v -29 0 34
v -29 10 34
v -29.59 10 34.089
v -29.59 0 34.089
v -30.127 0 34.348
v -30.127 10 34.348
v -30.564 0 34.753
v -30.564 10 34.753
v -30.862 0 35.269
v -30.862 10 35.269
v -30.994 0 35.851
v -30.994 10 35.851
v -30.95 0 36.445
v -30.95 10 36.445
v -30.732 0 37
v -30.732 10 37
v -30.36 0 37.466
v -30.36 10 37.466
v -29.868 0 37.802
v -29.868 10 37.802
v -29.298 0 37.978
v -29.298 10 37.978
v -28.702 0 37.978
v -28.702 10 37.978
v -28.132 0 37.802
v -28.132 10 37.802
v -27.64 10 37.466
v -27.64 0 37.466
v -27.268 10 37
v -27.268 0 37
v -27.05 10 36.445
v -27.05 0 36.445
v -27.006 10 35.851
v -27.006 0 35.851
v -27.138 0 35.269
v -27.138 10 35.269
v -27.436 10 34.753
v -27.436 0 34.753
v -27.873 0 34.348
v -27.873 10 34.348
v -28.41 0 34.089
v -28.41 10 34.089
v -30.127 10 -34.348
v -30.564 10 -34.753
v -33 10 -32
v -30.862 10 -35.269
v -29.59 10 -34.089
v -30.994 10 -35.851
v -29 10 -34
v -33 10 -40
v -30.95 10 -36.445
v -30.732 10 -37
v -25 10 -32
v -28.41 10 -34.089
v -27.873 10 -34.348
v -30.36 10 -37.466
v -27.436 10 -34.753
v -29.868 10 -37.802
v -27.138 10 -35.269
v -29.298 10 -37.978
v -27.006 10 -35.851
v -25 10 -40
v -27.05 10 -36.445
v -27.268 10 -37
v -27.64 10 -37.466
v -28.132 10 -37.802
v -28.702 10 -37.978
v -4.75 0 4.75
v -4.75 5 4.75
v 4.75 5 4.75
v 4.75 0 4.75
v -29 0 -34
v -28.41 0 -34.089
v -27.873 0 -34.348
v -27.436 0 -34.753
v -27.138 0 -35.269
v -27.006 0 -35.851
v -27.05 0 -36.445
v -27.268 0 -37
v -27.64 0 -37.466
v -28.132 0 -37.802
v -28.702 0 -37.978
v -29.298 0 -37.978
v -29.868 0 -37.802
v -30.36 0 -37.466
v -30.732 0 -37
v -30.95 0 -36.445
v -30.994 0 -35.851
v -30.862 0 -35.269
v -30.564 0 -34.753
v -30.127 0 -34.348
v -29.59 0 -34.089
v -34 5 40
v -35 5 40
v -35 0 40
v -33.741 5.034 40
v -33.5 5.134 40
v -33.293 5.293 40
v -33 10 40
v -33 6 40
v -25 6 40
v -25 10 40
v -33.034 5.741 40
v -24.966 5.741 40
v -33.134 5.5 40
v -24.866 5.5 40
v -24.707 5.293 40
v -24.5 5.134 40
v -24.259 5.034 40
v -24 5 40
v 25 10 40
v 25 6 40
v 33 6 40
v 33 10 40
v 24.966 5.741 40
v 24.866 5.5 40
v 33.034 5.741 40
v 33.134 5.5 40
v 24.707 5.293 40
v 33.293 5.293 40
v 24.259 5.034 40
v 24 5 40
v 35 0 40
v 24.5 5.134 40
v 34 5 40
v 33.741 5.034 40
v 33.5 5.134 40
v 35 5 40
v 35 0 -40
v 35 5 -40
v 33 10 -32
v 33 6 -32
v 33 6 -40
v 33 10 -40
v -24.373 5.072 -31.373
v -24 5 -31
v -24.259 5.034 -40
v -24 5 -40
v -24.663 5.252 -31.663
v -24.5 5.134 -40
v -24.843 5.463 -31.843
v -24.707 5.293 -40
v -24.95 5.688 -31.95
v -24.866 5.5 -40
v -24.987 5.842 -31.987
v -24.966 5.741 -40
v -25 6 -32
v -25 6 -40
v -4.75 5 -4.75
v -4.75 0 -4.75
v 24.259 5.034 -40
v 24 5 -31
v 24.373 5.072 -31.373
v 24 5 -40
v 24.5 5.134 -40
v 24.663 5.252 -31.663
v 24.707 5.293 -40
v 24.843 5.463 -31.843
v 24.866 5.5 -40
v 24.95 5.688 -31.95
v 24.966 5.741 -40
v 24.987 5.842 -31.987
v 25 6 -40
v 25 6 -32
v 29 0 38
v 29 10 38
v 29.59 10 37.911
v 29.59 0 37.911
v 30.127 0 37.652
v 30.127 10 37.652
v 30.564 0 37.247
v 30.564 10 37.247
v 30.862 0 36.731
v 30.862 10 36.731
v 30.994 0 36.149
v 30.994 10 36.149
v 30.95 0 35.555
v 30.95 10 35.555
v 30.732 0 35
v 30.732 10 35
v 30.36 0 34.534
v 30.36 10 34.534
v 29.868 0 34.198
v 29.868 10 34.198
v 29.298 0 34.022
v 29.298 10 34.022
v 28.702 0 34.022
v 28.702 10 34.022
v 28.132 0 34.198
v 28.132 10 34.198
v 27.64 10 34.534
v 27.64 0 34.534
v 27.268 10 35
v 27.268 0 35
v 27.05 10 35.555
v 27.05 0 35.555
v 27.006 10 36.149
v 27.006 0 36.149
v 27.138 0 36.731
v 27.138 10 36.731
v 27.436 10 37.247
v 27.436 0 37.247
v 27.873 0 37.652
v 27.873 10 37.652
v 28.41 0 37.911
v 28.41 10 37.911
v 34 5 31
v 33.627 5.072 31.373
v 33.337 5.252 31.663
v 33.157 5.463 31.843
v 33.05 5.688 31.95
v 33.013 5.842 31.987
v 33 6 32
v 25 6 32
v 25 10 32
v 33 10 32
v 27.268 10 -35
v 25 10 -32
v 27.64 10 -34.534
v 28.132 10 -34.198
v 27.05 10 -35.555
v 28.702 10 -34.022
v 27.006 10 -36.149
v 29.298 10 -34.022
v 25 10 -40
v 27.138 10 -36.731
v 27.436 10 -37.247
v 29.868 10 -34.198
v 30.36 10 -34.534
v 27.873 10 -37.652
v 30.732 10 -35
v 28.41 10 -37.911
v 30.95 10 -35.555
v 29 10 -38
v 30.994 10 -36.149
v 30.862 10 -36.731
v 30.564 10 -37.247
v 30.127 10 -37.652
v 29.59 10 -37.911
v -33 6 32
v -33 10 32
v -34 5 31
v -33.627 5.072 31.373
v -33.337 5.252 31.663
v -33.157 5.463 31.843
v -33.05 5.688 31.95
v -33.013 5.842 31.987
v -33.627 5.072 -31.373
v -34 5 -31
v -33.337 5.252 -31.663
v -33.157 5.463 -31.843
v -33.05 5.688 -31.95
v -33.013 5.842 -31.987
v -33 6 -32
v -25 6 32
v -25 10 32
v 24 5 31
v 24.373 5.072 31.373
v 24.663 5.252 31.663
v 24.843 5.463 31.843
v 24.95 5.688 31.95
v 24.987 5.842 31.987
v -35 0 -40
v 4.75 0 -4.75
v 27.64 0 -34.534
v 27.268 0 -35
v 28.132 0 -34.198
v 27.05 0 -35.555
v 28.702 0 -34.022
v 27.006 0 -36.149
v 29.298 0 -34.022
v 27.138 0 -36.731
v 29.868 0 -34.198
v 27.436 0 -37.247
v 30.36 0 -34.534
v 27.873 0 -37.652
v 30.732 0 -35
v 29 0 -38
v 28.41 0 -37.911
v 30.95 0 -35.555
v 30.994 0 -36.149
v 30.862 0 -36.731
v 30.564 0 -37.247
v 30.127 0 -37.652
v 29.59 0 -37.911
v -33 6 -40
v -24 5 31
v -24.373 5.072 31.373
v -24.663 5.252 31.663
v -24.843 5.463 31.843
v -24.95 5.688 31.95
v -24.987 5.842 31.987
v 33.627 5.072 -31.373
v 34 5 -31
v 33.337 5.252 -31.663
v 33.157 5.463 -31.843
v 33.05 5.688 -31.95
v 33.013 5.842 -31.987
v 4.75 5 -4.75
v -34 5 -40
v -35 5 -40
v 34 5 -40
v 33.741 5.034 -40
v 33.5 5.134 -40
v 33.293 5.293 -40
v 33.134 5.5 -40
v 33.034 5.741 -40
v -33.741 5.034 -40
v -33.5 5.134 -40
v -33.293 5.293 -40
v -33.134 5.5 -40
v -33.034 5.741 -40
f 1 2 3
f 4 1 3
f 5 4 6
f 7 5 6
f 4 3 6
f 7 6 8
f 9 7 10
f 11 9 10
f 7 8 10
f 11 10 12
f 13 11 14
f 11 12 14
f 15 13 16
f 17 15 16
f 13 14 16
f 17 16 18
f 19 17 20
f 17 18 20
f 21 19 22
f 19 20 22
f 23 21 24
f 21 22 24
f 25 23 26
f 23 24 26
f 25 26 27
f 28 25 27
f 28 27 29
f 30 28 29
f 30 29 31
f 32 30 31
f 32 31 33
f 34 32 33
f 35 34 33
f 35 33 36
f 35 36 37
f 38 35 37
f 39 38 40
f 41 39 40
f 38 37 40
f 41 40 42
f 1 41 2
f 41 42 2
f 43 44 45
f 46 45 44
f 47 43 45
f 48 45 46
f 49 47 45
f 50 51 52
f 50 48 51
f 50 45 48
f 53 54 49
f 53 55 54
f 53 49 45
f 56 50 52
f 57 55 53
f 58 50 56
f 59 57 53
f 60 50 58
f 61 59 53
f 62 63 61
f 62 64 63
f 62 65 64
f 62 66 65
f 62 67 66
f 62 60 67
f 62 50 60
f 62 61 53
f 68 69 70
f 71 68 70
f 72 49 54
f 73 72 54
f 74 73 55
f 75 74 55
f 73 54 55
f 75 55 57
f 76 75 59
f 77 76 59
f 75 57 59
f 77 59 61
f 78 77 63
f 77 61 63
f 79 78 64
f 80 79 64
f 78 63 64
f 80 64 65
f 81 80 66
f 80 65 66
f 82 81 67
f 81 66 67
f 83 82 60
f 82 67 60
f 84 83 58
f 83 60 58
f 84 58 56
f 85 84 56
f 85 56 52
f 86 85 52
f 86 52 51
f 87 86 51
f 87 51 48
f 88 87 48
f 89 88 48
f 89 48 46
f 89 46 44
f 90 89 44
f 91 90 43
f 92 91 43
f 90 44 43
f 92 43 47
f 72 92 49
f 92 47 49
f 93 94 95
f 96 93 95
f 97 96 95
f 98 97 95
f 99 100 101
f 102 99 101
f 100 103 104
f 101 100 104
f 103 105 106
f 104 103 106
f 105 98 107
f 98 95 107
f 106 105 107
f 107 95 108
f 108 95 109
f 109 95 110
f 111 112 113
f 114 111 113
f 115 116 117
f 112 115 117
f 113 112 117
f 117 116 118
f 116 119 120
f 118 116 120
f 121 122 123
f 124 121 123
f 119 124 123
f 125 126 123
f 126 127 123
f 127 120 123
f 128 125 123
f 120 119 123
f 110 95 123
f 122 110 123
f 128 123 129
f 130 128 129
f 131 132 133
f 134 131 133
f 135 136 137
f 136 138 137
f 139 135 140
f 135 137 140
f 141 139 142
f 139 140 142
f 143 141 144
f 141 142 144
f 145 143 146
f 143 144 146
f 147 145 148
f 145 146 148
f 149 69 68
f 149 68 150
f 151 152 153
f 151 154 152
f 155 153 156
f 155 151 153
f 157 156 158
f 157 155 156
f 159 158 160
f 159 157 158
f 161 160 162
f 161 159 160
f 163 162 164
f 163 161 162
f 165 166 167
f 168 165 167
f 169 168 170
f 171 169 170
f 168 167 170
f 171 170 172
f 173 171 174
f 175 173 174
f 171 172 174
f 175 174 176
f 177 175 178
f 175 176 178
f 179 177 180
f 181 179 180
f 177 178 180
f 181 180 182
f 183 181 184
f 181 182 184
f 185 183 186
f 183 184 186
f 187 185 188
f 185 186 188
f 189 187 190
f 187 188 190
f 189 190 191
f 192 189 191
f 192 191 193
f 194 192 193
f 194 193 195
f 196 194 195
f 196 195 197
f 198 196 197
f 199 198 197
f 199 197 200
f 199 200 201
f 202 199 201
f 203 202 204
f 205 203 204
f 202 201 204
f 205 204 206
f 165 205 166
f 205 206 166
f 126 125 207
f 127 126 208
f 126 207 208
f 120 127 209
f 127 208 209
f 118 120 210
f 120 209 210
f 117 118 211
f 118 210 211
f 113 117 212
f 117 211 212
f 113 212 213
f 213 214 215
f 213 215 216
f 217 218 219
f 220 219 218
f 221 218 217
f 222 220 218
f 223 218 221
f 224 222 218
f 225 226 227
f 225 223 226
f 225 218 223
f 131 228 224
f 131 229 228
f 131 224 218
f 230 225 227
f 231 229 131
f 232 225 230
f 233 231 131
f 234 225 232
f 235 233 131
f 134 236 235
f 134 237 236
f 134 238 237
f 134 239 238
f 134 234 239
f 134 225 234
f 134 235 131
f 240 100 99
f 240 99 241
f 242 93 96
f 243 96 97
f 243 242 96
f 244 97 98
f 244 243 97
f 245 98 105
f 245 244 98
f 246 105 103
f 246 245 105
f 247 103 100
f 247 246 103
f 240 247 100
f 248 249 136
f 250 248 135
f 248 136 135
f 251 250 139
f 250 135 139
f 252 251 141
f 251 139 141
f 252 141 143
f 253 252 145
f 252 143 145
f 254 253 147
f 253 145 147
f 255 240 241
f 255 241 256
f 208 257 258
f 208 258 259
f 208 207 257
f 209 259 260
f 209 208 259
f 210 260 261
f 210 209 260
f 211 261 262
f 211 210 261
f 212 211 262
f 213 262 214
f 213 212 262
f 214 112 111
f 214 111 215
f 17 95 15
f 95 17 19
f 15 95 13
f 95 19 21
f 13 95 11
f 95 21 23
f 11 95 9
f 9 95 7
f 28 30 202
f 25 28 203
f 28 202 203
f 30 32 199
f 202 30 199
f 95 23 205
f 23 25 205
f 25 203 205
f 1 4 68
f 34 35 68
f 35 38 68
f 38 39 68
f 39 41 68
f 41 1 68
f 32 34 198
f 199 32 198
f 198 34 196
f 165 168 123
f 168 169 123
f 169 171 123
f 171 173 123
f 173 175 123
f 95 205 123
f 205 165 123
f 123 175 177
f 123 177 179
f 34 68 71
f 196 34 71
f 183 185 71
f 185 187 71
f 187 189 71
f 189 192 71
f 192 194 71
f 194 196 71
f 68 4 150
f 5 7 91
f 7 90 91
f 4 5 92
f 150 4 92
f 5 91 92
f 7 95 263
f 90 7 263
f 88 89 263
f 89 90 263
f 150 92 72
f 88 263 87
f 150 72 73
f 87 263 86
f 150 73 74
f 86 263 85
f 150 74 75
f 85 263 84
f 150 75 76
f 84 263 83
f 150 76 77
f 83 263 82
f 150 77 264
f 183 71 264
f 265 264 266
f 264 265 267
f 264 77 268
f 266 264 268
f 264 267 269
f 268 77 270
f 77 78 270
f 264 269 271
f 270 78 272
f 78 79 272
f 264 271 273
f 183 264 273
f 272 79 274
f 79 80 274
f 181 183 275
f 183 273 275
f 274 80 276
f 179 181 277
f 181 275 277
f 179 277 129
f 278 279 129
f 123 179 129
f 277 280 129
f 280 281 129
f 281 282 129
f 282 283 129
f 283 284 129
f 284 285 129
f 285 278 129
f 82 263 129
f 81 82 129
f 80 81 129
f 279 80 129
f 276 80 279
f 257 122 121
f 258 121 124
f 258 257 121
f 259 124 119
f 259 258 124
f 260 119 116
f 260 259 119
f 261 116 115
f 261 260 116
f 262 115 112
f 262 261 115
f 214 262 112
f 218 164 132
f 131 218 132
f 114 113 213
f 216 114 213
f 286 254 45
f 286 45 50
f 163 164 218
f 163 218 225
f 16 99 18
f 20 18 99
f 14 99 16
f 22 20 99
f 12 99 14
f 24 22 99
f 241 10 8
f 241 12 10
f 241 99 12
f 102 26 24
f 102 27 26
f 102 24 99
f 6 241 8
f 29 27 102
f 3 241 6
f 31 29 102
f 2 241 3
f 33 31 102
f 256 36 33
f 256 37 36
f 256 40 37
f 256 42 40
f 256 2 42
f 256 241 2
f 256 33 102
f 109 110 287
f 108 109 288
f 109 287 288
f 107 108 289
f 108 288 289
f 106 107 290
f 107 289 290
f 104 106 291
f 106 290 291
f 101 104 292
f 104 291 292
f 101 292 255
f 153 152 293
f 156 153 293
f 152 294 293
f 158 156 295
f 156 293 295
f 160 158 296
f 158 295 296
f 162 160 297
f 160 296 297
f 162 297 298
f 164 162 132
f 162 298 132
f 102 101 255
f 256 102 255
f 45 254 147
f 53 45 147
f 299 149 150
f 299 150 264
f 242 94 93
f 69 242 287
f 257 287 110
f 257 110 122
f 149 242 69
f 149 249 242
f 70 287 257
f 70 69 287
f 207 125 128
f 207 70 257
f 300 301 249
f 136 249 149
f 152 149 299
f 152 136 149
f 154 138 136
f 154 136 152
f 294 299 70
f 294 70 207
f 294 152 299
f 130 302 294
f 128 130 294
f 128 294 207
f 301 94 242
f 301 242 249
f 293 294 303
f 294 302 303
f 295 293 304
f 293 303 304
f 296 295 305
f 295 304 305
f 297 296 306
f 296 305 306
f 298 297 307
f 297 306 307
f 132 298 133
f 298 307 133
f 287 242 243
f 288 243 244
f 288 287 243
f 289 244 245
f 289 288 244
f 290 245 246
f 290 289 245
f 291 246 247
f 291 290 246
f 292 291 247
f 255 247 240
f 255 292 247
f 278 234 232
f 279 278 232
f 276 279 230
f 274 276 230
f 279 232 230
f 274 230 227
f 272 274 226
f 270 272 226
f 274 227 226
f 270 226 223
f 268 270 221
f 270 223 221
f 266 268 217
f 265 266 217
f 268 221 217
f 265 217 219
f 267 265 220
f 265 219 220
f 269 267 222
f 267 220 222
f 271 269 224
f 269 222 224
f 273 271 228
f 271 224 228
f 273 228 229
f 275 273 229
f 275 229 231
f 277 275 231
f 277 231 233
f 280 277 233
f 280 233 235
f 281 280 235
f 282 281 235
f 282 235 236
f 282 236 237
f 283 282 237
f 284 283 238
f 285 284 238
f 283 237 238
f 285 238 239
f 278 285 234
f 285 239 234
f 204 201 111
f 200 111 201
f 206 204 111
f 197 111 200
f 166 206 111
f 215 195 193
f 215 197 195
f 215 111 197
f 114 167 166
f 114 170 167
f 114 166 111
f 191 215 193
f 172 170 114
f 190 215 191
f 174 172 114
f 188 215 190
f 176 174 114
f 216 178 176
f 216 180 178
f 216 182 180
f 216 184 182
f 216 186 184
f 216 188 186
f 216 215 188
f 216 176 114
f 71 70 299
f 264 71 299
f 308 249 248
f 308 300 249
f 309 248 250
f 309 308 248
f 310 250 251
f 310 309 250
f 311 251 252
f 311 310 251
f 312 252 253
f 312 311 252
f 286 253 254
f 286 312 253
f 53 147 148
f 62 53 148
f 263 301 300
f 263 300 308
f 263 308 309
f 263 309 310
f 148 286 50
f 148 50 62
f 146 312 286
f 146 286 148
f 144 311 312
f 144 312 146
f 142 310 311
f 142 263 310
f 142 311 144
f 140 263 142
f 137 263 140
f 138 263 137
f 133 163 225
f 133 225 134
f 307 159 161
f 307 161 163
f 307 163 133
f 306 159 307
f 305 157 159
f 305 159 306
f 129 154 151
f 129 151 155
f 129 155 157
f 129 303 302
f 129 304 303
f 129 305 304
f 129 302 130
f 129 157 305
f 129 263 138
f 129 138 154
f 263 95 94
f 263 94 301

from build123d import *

# Parameters (mm, degrees)
SKETCH_1_W          = 70
SKETCH_1_H          = 80
EXTRUDE_1_DEPTH     = 5
SKETCH_3_W          = 8
SKETCH_3_H          = 8
EXTRUDE_3_DEPTH     = 5
SKETCH_12_R         = 2
SKETCH_12_W         = 9.5
SKETCH_12_H         = 9.5
CUT_EXTRUDE_2_DEPTH = 10
FILLET_1_R          = 1


with BuildPart() as part:
    # 草圖1 → 填料-伸長1 (new body)
    with BuildSketch(Plane(origin=(0, 0, 0), x_dir=(1, 0, 0), z_dir=(0, 1, 0))):
        Rectangle(SKETCH_1_W, SKETCH_1_H)
    extrude(amount=EXTRUDE_1_DEPTH)

    # 草圖3 → 填料-伸長3 (add)
    with BuildSketch(Plane(origin=(0, 5, 0), x_dir=(1, 0, 0), z_dir=(0, 1, 0))):
        with Locations((-29, -36)):
            Rectangle(SKETCH_3_W, SKETCH_3_H)
        with Locations((-29, 36)):
            Rectangle(SKETCH_3_W, SKETCH_3_H)
        with Locations((29, -36)):
            Rectangle(SKETCH_3_W, SKETCH_3_H)
        with Locations((29, 36)):
            Rectangle(SKETCH_3_W, SKETCH_3_H)
    extrude(amount=EXTRUDE_3_DEPTH)

    # 草圖12 → 除料-伸長2 (cut)
    with BuildSketch(Plane(origin=(0, 10, 0), x_dir=(1, 0, 0), z_dir=(0, 1, 0))):
        with Locations(Location((-29, 36, 0), (0, 0, 270))):
            Circle(SKETCH_12_R)
        with Locations(Location((-29, -36, 0), (0, 0, 90))):
            Circle(SKETCH_12_R)
        with Locations(Location((29, -36, 0), (0, 0, 270))):
            Circle(SKETCH_12_R)
        with Locations(Location((29, 36, 0), (0, 0, 90))):
            Circle(SKETCH_12_R)
        Rectangle(SKETCH_12_W, SKETCH_12_H)
    extrude(amount=-CUT_EXTRUDE_2_DEPTH, mode=Mode.SUBTRACT)

    # 圓角1
    fillet_1_edges = [part.edges().sort_by_distance(p)[0] for p in [
        (-33, 5, 36),
        (-25, 5, 36),
        (-29, 5, 32),
        (-33, 5, -36),
        (-29, 5, -32),
        (-25, 5, -36),
        (33, 5, 36),
        (29, 5, 32),
        (25, 5, 36),
        (33, 5, -36),
        (25, 5, -36),
        (29, 5, -32),
    ]]
    fillet(fillet_1_edges, radius=FILLET_1_R)


solid = part.part
